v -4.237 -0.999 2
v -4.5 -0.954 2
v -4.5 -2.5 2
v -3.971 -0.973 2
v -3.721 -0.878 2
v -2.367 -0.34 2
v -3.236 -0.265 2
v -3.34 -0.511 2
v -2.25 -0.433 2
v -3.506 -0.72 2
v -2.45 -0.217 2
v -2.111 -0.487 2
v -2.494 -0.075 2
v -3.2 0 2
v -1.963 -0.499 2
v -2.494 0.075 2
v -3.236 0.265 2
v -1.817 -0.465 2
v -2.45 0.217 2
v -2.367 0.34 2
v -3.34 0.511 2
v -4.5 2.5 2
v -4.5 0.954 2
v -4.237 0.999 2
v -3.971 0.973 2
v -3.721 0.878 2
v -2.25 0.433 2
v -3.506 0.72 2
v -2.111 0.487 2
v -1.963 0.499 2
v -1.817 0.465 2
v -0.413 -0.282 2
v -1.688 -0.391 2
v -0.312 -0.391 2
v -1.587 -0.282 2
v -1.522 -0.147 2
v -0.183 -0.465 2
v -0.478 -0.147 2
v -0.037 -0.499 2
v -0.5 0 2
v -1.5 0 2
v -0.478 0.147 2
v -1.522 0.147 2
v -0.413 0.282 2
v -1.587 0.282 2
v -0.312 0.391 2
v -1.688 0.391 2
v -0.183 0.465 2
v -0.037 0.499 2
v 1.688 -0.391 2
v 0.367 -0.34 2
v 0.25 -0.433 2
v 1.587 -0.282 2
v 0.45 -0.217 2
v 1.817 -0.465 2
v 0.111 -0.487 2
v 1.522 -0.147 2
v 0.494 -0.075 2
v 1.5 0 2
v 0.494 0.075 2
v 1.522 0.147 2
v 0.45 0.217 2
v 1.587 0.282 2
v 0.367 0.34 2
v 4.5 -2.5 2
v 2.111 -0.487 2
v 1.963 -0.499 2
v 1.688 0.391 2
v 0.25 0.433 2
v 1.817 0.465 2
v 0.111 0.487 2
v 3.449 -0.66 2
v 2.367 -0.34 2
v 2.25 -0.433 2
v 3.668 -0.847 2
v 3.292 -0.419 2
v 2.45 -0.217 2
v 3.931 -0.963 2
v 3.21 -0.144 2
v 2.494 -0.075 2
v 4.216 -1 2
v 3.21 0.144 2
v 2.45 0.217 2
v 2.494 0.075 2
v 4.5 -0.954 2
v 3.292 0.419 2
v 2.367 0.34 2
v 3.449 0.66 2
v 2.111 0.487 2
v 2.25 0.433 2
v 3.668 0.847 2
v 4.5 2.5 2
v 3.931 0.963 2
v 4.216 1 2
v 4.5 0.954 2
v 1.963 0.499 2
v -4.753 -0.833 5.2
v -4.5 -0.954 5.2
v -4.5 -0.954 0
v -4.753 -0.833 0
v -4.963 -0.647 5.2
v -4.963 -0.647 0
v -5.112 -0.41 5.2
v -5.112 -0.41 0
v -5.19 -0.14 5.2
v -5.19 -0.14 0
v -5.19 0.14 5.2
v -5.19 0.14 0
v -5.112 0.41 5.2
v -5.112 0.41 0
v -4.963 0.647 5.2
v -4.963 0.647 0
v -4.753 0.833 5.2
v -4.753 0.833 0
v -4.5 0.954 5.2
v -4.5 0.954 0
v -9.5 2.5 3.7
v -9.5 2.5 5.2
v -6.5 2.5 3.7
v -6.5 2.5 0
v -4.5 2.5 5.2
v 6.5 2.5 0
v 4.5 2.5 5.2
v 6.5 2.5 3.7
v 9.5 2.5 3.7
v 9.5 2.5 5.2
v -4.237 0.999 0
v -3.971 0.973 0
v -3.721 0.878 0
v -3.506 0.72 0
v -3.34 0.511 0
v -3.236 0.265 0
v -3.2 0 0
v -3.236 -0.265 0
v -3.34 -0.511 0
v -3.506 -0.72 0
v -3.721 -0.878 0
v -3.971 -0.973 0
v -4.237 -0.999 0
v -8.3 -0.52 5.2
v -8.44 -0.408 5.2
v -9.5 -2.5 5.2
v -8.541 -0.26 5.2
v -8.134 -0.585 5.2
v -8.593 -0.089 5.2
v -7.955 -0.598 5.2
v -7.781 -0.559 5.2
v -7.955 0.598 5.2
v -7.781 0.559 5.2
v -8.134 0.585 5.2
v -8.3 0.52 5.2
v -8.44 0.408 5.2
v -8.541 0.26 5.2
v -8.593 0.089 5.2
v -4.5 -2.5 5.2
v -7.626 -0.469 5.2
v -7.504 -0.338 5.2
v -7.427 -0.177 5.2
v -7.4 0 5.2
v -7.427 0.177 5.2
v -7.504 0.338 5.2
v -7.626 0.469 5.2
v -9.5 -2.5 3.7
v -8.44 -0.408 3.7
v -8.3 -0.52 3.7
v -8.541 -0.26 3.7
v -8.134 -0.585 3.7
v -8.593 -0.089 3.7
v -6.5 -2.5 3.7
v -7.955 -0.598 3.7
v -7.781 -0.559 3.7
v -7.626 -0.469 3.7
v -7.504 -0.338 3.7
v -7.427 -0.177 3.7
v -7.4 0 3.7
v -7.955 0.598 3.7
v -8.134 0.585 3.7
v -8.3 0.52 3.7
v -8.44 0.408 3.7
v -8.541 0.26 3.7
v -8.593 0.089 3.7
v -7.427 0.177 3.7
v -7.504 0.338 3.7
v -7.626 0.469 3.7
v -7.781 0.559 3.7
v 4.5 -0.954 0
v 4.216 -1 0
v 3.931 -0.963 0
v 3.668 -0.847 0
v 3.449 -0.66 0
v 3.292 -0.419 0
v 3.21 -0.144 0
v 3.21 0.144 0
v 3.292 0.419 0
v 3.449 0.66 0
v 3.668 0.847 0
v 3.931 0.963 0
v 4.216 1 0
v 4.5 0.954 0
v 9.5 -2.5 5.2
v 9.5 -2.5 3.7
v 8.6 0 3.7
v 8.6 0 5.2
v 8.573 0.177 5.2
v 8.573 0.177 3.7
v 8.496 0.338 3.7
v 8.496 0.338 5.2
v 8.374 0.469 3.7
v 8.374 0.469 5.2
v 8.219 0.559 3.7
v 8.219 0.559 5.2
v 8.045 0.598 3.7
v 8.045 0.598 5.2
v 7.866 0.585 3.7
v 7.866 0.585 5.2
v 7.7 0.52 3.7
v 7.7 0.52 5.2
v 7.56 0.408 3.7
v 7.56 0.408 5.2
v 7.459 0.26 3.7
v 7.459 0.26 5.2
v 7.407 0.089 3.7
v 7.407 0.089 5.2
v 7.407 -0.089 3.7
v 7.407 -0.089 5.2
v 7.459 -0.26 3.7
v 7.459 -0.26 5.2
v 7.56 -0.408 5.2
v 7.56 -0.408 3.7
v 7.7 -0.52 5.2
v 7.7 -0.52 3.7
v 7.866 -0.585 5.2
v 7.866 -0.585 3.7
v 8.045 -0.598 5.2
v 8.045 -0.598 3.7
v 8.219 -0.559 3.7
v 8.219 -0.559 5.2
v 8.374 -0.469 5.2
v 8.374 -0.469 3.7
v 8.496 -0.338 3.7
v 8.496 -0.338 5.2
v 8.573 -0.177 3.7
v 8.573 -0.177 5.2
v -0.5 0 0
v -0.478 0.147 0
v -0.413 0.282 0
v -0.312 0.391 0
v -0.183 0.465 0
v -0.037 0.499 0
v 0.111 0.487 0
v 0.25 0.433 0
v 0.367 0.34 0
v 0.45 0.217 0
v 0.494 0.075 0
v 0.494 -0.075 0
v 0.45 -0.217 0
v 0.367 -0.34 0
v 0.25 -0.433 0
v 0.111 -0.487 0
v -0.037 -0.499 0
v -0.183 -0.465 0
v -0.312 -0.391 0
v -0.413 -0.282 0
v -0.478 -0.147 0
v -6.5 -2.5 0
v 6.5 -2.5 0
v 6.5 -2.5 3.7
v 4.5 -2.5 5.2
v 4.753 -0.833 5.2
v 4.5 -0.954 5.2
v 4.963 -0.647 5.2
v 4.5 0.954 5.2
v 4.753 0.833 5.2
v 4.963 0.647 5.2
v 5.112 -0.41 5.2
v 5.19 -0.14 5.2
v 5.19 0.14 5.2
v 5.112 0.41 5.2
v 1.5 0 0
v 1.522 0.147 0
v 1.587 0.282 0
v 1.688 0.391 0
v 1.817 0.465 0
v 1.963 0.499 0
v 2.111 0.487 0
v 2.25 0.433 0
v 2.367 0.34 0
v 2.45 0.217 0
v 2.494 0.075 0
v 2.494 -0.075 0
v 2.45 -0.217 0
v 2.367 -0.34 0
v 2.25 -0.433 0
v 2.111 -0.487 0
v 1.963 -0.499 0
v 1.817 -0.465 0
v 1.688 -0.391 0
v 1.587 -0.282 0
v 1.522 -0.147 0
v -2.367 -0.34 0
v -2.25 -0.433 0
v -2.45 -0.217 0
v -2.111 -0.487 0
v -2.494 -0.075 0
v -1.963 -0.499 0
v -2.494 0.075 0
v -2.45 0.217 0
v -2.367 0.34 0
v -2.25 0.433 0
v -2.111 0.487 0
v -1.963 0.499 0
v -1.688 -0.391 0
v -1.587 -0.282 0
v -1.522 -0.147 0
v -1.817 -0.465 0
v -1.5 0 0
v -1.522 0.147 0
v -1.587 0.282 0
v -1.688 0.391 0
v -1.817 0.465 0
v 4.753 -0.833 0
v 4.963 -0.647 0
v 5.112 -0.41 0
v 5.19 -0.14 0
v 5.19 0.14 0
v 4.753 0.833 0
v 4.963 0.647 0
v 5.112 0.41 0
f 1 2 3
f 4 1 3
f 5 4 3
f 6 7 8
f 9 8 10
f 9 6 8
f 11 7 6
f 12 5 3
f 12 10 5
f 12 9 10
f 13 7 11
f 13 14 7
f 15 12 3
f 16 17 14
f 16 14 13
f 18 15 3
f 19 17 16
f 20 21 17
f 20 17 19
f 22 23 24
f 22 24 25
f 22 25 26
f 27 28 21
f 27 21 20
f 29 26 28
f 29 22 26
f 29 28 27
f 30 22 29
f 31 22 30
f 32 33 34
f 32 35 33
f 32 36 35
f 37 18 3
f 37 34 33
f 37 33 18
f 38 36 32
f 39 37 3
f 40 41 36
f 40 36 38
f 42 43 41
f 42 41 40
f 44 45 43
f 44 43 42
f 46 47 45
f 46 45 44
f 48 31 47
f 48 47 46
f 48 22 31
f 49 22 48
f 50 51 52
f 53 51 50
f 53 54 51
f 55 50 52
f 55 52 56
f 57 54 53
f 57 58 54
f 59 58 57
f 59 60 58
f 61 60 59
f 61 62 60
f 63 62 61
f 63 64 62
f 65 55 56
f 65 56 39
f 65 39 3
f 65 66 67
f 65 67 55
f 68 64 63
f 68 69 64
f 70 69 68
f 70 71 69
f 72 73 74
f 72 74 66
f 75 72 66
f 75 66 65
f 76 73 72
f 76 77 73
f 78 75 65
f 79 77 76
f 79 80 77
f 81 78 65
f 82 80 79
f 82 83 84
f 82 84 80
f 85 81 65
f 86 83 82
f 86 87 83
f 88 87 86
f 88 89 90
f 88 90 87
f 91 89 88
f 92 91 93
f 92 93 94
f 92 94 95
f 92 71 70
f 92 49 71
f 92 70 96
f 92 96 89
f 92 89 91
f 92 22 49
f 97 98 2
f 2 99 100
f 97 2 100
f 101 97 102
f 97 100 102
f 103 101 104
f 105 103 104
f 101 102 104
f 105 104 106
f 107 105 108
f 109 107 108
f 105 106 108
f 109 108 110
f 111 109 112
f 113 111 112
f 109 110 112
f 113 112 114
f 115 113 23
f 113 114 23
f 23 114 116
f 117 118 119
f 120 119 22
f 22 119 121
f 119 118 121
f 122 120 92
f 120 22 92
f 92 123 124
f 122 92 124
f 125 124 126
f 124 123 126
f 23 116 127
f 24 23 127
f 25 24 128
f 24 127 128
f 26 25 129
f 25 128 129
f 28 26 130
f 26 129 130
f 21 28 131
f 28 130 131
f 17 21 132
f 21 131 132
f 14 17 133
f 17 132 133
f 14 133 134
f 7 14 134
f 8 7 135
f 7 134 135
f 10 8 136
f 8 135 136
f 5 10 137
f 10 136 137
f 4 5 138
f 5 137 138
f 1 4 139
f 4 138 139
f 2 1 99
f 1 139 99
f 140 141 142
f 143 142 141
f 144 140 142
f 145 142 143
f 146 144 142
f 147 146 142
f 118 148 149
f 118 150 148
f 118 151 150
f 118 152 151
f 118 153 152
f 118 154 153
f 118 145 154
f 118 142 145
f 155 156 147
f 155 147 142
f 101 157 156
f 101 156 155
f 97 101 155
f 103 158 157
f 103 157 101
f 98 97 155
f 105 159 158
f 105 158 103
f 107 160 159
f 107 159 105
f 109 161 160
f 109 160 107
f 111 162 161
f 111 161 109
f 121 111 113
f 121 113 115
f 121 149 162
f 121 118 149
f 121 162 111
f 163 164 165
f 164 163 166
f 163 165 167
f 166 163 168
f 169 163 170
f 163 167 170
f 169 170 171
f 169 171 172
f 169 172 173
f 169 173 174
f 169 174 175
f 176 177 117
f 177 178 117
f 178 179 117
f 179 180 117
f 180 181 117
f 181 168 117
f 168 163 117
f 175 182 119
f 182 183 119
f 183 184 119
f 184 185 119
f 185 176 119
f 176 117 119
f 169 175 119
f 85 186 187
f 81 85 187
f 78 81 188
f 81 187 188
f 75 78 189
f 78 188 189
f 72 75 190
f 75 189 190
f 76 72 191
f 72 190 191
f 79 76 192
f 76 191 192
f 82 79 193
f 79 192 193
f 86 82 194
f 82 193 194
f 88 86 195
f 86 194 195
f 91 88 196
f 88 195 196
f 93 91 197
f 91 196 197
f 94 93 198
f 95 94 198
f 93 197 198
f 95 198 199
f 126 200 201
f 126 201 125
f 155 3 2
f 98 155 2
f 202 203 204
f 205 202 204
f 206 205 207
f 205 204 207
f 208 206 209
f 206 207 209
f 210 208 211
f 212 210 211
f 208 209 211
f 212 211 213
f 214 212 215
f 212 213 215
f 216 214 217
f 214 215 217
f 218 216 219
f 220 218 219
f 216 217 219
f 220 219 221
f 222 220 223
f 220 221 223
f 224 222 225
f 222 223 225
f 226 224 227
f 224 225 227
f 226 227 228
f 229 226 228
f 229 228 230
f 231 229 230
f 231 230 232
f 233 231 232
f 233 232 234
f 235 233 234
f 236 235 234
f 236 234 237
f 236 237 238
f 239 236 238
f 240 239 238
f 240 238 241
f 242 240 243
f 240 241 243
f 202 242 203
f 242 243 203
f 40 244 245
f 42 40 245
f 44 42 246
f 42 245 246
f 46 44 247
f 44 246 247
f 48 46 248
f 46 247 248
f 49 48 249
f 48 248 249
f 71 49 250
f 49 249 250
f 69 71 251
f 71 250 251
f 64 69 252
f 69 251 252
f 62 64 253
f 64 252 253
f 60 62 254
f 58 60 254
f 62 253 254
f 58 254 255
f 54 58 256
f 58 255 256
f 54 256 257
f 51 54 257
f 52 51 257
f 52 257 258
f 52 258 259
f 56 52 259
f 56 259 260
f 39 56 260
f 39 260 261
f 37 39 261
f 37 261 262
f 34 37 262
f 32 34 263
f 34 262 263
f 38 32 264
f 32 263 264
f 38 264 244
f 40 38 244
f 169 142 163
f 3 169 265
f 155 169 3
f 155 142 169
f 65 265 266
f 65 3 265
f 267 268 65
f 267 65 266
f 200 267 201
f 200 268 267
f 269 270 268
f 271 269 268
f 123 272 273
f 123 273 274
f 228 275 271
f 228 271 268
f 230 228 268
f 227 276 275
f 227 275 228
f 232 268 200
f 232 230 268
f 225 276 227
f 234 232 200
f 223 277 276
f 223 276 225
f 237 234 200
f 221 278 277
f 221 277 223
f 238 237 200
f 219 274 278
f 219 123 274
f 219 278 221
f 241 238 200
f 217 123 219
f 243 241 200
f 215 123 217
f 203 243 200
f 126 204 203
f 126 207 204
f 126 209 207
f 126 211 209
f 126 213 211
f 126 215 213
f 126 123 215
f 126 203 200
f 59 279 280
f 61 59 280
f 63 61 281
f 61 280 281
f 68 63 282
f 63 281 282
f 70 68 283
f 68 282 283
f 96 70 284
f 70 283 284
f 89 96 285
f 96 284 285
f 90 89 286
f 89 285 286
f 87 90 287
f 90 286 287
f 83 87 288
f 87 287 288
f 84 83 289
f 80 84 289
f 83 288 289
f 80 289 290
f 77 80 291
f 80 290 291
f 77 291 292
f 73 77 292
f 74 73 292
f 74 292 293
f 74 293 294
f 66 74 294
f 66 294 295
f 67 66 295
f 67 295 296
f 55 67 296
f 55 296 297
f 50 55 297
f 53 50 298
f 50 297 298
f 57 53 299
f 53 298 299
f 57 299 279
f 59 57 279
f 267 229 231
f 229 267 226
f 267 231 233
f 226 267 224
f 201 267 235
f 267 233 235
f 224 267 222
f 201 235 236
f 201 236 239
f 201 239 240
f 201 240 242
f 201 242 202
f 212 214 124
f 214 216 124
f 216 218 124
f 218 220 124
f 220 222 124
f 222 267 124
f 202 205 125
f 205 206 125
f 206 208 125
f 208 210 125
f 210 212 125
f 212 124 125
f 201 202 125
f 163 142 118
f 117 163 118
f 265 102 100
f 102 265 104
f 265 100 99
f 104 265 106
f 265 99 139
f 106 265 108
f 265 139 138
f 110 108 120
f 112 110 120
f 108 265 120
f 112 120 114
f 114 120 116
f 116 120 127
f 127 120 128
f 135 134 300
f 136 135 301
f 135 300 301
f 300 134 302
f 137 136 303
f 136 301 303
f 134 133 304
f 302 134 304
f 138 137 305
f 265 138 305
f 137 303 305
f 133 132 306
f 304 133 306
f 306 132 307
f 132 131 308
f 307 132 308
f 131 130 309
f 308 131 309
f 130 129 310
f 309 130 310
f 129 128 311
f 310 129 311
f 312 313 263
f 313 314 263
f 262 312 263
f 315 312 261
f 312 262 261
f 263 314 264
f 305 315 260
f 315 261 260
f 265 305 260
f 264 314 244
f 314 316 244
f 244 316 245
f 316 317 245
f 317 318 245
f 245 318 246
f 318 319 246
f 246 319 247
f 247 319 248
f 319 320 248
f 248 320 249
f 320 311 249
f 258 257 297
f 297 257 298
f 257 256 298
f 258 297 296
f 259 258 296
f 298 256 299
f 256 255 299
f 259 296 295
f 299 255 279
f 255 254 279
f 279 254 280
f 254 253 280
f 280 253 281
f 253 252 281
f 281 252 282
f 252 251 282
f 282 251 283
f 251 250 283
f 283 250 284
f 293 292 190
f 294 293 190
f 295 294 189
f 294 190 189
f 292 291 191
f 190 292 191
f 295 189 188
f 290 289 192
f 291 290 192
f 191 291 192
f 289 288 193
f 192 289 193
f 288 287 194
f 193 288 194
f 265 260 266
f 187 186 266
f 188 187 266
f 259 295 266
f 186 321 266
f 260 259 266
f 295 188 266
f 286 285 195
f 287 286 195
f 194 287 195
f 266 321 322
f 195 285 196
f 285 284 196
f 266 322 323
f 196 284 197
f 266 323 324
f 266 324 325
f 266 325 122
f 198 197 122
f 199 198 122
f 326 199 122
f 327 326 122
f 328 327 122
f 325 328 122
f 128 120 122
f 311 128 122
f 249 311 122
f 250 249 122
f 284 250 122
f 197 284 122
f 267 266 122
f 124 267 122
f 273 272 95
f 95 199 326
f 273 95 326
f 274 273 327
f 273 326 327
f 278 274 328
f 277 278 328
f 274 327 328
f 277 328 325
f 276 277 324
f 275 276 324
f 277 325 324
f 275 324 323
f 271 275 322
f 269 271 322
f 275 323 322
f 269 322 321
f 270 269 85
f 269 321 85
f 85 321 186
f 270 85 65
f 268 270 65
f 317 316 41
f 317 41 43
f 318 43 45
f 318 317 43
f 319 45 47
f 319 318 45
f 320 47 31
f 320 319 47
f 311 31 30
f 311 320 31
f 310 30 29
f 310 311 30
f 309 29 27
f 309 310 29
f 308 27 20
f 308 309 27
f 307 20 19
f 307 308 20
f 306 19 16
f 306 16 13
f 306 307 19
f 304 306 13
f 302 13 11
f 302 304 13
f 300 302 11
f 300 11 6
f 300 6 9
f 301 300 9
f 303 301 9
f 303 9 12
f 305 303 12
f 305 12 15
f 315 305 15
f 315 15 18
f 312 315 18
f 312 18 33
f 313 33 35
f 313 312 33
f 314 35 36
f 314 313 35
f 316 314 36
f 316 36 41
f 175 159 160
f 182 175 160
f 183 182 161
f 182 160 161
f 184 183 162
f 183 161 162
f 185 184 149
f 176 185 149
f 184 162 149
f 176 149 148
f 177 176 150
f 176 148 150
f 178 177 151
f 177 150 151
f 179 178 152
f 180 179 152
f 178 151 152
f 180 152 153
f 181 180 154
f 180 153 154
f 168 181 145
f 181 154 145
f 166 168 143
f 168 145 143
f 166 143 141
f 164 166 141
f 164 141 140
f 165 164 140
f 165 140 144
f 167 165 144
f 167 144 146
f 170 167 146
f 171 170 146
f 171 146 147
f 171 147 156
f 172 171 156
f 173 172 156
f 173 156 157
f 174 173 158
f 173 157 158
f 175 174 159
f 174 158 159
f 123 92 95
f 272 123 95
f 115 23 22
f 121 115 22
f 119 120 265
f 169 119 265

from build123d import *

# Parameters (mm, degrees)
SKETCH_1_R      = 0.5
EXTRUDE_1_DEPTH = 2
EXTRUDE_2_DEPTH = 5.2
EXTRUDE_START   = 5.2
SKETCH_1_13_W   = 3
SKETCH_1_13_H   = 5
SKETCH_1_13_R   = 0.6
EXTRUDE_3_DEPTH = 1.5


with BuildPart() as part:
    # 草图1 → 凸台-拉伸1 (new body)
    with BuildSketch(Plane.XY):
        with BuildLine():
            Line((4.5, 2.5), (-4.5, 2.5))
            Line((-4.5, 2.5), (-4.5, 0.953939201))
            ThreePointArc((-4.5, 0.953939201), (-3.608392022, 0.806225775), (-3.2, 0))
            ThreePointArc((-3.2, 0), (-3.608392022, -0.806225775), (-4.5, -0.953939201))
            Line((-4.5, -0.953939201), (-4.5, -2.5))
            Line((-4.5, -2.5), (4.5, -2.5))
            Line((4.5, -2.5), (4.5, -0.953939201))
            ThreePointArc((4.5, -0.953939201), (3.2, 0), (4.5, 0.953939201))
            Line((4.5, 0.953939201), (4.5, 2.5))
        make_face()
        with BuildLine():
            ThreePointArc((2.5, 0), (2, -0.5), (1.5, 0))
            ThreePointArc((1.5, 0), (2, 0.5), (2.5, 0))
        make_face(mode=Mode.SUBTRACT)
        with Locations((-2, 0)):
            Circle(SKETCH_1_R, mode=Mode.SUBTRACT)
        with BuildLine():
            ThreePointArc((0.5, 0), (0, -0.5), (-0.5, 0))
            ThreePointArc((-0.5, 0), (0, 0.5), (0.5, 0))
        make_face(mode=Mode.SUBTRACT)
    extrude(amount=EXTRUDE_1_DEPTH)

    # 草图1<10> → 凸台-拉伸2 (add)
    with BuildSketch(Plane.XY):
        with BuildLine():
            Line((-4.5, 0.953939201), (-4.5, 2.5))
            Line((-4.5, 2.5), (-6.5, 2.5))
            Line((-6.5, 2.5), (-6.5, -2.5))
            Line((-6.5, -2.5), (-4.5, -2.5))
            Line((-4.5, -2.5), (-4.5, -0.953939201))
            ThreePointArc((-4.5, -0.953939201), (-5.2, 0), (-4.5, 0.953939201))
        make_face()
        with BuildLine():
            Line((6.5, 2.5), (4.5, 2.5))
            Line((4.5, 2.5), (4.5, 0.953939201))
            ThreePointArc((4.5, 0.953939201), (5.2, 0), (4.5, -0.953939201))
            Line((4.5, -0.953939201), (4.5, -2.5))
            Line((4.5, -2.5), (6.5, -2.5))
            Line((6.5, -2.5), (6.5, 2.5))
        make_face()
    extrude(amount=EXTRUDE_2_DEPTH)

    # 草图1<13> → 凸台-拉伸3 (add)
    # profile 1 of 2: a face of its own
    with BuildSketch(Plane.XY.offset(EXTRUDE_START)):
        with Locations((-8, 0)):
            Rectangle(SKETCH_1_13_W, SKETCH_1_13_H)
        with Locations((-8, 0)):
            Circle(SKETCH_1_13_R, mode=Mode.SUBTRACT)
    # profile 2 of 2: a face of its own
    with BuildSketch(Plane.XY.offset(EXTRUDE_START)):
        with Locations((8, 0)):
            Rectangle(SKETCH_1_13_W, SKETCH_1_13_H)
        with Locations((8, 0)):
            Circle(SKETCH_1_13_R, mode=Mode.SUBTRACT)
    extrude(amount=-EXTRUDE_3_DEPTH)


solid = part.part
